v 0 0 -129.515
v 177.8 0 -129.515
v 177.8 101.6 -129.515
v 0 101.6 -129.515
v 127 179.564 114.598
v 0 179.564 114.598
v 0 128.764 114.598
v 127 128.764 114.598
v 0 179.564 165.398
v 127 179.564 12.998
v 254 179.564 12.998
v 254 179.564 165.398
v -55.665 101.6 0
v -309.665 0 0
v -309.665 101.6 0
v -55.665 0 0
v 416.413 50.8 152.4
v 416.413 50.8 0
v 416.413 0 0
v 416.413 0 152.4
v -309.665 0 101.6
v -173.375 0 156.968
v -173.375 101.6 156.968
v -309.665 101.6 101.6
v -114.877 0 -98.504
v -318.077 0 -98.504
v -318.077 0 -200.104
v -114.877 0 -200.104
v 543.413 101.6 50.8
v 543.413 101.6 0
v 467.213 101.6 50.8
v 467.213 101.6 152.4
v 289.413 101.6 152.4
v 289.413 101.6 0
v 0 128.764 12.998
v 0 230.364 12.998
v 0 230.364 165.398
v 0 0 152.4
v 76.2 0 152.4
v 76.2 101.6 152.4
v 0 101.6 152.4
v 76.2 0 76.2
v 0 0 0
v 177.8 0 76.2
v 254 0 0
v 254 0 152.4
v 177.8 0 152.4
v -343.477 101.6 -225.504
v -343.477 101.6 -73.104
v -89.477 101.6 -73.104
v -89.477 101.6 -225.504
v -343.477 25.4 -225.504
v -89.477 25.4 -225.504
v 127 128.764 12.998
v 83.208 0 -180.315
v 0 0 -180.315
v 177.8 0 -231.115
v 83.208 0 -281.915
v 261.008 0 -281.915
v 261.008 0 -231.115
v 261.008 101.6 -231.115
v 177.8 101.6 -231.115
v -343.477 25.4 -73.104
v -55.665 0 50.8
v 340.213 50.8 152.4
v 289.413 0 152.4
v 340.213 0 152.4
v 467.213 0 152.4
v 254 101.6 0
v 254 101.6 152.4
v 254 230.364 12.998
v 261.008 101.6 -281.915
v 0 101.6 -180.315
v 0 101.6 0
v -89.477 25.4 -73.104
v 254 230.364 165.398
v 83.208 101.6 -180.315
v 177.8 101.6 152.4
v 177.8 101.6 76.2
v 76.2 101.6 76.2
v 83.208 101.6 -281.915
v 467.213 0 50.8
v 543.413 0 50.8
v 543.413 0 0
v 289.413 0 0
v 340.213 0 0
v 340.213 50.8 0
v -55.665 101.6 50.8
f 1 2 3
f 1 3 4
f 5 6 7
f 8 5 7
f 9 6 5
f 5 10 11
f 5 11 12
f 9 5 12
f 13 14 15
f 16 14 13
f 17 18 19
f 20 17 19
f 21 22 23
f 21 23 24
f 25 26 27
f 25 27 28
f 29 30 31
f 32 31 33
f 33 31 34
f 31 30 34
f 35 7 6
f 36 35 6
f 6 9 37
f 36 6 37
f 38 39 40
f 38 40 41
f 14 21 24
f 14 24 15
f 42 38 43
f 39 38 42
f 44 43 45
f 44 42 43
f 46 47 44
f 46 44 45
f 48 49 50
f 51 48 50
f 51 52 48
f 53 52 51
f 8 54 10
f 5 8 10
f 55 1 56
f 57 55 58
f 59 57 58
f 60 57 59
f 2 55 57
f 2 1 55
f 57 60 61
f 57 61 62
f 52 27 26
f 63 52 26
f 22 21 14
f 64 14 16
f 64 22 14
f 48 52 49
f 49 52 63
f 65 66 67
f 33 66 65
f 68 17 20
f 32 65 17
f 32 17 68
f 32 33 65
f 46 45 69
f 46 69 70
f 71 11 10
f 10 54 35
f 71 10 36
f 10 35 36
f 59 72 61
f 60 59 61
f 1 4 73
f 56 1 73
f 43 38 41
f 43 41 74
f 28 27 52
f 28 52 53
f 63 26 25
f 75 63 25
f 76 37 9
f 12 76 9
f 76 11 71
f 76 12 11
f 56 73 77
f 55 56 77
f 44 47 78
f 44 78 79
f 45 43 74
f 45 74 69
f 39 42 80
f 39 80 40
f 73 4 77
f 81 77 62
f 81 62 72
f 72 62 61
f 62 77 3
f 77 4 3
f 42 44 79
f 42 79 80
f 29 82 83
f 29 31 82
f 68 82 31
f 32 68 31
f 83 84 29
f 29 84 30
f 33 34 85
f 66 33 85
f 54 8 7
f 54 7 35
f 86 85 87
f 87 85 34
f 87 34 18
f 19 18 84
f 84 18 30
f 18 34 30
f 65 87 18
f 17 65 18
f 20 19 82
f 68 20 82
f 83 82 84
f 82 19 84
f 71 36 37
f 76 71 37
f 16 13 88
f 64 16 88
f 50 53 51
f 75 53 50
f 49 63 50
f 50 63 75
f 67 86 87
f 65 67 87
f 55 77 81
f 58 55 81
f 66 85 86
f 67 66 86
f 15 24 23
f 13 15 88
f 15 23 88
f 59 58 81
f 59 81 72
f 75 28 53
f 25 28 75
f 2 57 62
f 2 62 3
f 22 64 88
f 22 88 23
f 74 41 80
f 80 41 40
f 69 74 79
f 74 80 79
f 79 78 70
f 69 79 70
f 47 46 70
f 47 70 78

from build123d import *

# Parameters (mm, degrees)
F1_DEPTH  = 101.6
F3_DEPTH  = 254
F4_W      = 50.8
F4_H      = 101.6
F5_DEPTH  = 127
F7_DEPTH  = 152.4
F6_W      = 76.2
F6_H      = 101.6
F8_DEPTH  = 50.8
F10_DEPTH = 101.6
F12_DEPTH = 101.6
F13_W     = 254
F13_H     = 152.4
F13_W_2   = 203.2
F13_H_2   = 101.6
F14_DEPTH = 101.6
F15_SIZE  = 25.4


with BuildPart() as f1:
    # F0 (on Front) → F1 (new body)
    with BuildSketch(Plane.XZ):
        Polygon((0, 152.4), (0, 0), (254, 0), (254, 152.4), (177.8, 152.4), (177.8, 76.2), (76.2, 76.2), (76.2, 152.4), align=None)
    extrude(amount=-F1_DEPTH)


with BuildPart() as f3:
    # F2 (on Right) → F3 (new body)
    with BuildSketch(Plane.YZ):
        Polygon((230.363947, 12.99777), (230.363947, 165.39777), (179.563947, 165.39777), (179.563947, 114.59777), (128.763947, 114.59777), (128.763947, 12.99777), align=None)
    extrude(amount=F3_DEPTH)

    # F4 (on face) → F5 (cut)
    with BuildSketch(Plane.YZ.offset(254)):
        with Locations((154.163947, 63.79777)):
            Rectangle(F4_W, F4_H)
    extrude(amount=-F5_DEPTH, mode=Mode.SUBTRACT)


with BuildPart() as f7:
    # F6 (on Top) → F7 (new body)
    with BuildSketch(Plane.XY):
        Polygon((416.413037, 0), (467.213037, 0), (467.213037, 101.6), (289.413037, 101.6), (289.413037, 0), (340.213037, 0), (340.213037, 50.8), (416.413037, 50.8), align=None)
    extrude(amount=F7_DEPTH)

    # F6 (on Top) → F8 (join)
    with BuildSketch(Plane.XY):
        with Locations((505.313037, 50.8)):
            Rectangle(F6_W, F6_H)
        Polygon((416.413037, 0), (467.213037, 0), (467.213037, 101.6), (289.413037, 101.6), (289.413037, 0), (340.213037, 0), (340.213037, 50.8), (416.413037, 50.8), align=None)
    extrude(amount=F8_DEPTH)


with BuildPart() as f10:
    # F9 (on Front) → F10 (new body)
    with BuildSketch(Plane.XZ):
        Polygon((177.8, -129.515269), (0, -129.515269), (0, -180.315269), (83.208472, -180.315269), (83.208472, -281.915269), (261.008472, -281.915269), (261.008472, -231.115269), (177.8, -231.115269), align=None)
    extrude(amount=-F10_DEPTH)


with BuildPart() as f12:
    # F11 (on Front) → F12 (new body)
    with BuildSketch(Plane.XZ):
        Polygon((-309.664648, 0), (-55.664648, 0), (-55.664648, 50.8), (-173.37502, 156.967672), (-309.664648, 101.6), align=None)
    extrude(amount=-F12_DEPTH)


with BuildPart() as f14:
    # F13 (on Front) → F14 (new body)
    with BuildSketch(Plane.XZ):
        with Locations((-216.476953, -149.304441)):
            Rectangle(F13_W, F13_H)
        with Locations((-222.070536, -144.596387)):
            Rectangle(F13_W_2, F13_H_2, mode=Mode.SUBTRACT)
        with Locations((-222.070536, -144.596387)):
            Rectangle(F13_W_2, F13_H_2)
    extrude(amount=-F14_DEPTH)

    # F15
    f15_edges = [f14.edges().sort_by_distance(p)[0] for p in [
        (-89.476953, 0, -149.304441),
        (-216.476953, 0, -73.104441),
        (-343.476953, 0, -149.304441),
        (-216.476953, 0, -225.504441),
    ]]
    chamfer(f15_edges, length=F15_SIZE)


solid = Compound([f1.part, f3.part, f7.part, f10.part, f12.part, f14.part])
